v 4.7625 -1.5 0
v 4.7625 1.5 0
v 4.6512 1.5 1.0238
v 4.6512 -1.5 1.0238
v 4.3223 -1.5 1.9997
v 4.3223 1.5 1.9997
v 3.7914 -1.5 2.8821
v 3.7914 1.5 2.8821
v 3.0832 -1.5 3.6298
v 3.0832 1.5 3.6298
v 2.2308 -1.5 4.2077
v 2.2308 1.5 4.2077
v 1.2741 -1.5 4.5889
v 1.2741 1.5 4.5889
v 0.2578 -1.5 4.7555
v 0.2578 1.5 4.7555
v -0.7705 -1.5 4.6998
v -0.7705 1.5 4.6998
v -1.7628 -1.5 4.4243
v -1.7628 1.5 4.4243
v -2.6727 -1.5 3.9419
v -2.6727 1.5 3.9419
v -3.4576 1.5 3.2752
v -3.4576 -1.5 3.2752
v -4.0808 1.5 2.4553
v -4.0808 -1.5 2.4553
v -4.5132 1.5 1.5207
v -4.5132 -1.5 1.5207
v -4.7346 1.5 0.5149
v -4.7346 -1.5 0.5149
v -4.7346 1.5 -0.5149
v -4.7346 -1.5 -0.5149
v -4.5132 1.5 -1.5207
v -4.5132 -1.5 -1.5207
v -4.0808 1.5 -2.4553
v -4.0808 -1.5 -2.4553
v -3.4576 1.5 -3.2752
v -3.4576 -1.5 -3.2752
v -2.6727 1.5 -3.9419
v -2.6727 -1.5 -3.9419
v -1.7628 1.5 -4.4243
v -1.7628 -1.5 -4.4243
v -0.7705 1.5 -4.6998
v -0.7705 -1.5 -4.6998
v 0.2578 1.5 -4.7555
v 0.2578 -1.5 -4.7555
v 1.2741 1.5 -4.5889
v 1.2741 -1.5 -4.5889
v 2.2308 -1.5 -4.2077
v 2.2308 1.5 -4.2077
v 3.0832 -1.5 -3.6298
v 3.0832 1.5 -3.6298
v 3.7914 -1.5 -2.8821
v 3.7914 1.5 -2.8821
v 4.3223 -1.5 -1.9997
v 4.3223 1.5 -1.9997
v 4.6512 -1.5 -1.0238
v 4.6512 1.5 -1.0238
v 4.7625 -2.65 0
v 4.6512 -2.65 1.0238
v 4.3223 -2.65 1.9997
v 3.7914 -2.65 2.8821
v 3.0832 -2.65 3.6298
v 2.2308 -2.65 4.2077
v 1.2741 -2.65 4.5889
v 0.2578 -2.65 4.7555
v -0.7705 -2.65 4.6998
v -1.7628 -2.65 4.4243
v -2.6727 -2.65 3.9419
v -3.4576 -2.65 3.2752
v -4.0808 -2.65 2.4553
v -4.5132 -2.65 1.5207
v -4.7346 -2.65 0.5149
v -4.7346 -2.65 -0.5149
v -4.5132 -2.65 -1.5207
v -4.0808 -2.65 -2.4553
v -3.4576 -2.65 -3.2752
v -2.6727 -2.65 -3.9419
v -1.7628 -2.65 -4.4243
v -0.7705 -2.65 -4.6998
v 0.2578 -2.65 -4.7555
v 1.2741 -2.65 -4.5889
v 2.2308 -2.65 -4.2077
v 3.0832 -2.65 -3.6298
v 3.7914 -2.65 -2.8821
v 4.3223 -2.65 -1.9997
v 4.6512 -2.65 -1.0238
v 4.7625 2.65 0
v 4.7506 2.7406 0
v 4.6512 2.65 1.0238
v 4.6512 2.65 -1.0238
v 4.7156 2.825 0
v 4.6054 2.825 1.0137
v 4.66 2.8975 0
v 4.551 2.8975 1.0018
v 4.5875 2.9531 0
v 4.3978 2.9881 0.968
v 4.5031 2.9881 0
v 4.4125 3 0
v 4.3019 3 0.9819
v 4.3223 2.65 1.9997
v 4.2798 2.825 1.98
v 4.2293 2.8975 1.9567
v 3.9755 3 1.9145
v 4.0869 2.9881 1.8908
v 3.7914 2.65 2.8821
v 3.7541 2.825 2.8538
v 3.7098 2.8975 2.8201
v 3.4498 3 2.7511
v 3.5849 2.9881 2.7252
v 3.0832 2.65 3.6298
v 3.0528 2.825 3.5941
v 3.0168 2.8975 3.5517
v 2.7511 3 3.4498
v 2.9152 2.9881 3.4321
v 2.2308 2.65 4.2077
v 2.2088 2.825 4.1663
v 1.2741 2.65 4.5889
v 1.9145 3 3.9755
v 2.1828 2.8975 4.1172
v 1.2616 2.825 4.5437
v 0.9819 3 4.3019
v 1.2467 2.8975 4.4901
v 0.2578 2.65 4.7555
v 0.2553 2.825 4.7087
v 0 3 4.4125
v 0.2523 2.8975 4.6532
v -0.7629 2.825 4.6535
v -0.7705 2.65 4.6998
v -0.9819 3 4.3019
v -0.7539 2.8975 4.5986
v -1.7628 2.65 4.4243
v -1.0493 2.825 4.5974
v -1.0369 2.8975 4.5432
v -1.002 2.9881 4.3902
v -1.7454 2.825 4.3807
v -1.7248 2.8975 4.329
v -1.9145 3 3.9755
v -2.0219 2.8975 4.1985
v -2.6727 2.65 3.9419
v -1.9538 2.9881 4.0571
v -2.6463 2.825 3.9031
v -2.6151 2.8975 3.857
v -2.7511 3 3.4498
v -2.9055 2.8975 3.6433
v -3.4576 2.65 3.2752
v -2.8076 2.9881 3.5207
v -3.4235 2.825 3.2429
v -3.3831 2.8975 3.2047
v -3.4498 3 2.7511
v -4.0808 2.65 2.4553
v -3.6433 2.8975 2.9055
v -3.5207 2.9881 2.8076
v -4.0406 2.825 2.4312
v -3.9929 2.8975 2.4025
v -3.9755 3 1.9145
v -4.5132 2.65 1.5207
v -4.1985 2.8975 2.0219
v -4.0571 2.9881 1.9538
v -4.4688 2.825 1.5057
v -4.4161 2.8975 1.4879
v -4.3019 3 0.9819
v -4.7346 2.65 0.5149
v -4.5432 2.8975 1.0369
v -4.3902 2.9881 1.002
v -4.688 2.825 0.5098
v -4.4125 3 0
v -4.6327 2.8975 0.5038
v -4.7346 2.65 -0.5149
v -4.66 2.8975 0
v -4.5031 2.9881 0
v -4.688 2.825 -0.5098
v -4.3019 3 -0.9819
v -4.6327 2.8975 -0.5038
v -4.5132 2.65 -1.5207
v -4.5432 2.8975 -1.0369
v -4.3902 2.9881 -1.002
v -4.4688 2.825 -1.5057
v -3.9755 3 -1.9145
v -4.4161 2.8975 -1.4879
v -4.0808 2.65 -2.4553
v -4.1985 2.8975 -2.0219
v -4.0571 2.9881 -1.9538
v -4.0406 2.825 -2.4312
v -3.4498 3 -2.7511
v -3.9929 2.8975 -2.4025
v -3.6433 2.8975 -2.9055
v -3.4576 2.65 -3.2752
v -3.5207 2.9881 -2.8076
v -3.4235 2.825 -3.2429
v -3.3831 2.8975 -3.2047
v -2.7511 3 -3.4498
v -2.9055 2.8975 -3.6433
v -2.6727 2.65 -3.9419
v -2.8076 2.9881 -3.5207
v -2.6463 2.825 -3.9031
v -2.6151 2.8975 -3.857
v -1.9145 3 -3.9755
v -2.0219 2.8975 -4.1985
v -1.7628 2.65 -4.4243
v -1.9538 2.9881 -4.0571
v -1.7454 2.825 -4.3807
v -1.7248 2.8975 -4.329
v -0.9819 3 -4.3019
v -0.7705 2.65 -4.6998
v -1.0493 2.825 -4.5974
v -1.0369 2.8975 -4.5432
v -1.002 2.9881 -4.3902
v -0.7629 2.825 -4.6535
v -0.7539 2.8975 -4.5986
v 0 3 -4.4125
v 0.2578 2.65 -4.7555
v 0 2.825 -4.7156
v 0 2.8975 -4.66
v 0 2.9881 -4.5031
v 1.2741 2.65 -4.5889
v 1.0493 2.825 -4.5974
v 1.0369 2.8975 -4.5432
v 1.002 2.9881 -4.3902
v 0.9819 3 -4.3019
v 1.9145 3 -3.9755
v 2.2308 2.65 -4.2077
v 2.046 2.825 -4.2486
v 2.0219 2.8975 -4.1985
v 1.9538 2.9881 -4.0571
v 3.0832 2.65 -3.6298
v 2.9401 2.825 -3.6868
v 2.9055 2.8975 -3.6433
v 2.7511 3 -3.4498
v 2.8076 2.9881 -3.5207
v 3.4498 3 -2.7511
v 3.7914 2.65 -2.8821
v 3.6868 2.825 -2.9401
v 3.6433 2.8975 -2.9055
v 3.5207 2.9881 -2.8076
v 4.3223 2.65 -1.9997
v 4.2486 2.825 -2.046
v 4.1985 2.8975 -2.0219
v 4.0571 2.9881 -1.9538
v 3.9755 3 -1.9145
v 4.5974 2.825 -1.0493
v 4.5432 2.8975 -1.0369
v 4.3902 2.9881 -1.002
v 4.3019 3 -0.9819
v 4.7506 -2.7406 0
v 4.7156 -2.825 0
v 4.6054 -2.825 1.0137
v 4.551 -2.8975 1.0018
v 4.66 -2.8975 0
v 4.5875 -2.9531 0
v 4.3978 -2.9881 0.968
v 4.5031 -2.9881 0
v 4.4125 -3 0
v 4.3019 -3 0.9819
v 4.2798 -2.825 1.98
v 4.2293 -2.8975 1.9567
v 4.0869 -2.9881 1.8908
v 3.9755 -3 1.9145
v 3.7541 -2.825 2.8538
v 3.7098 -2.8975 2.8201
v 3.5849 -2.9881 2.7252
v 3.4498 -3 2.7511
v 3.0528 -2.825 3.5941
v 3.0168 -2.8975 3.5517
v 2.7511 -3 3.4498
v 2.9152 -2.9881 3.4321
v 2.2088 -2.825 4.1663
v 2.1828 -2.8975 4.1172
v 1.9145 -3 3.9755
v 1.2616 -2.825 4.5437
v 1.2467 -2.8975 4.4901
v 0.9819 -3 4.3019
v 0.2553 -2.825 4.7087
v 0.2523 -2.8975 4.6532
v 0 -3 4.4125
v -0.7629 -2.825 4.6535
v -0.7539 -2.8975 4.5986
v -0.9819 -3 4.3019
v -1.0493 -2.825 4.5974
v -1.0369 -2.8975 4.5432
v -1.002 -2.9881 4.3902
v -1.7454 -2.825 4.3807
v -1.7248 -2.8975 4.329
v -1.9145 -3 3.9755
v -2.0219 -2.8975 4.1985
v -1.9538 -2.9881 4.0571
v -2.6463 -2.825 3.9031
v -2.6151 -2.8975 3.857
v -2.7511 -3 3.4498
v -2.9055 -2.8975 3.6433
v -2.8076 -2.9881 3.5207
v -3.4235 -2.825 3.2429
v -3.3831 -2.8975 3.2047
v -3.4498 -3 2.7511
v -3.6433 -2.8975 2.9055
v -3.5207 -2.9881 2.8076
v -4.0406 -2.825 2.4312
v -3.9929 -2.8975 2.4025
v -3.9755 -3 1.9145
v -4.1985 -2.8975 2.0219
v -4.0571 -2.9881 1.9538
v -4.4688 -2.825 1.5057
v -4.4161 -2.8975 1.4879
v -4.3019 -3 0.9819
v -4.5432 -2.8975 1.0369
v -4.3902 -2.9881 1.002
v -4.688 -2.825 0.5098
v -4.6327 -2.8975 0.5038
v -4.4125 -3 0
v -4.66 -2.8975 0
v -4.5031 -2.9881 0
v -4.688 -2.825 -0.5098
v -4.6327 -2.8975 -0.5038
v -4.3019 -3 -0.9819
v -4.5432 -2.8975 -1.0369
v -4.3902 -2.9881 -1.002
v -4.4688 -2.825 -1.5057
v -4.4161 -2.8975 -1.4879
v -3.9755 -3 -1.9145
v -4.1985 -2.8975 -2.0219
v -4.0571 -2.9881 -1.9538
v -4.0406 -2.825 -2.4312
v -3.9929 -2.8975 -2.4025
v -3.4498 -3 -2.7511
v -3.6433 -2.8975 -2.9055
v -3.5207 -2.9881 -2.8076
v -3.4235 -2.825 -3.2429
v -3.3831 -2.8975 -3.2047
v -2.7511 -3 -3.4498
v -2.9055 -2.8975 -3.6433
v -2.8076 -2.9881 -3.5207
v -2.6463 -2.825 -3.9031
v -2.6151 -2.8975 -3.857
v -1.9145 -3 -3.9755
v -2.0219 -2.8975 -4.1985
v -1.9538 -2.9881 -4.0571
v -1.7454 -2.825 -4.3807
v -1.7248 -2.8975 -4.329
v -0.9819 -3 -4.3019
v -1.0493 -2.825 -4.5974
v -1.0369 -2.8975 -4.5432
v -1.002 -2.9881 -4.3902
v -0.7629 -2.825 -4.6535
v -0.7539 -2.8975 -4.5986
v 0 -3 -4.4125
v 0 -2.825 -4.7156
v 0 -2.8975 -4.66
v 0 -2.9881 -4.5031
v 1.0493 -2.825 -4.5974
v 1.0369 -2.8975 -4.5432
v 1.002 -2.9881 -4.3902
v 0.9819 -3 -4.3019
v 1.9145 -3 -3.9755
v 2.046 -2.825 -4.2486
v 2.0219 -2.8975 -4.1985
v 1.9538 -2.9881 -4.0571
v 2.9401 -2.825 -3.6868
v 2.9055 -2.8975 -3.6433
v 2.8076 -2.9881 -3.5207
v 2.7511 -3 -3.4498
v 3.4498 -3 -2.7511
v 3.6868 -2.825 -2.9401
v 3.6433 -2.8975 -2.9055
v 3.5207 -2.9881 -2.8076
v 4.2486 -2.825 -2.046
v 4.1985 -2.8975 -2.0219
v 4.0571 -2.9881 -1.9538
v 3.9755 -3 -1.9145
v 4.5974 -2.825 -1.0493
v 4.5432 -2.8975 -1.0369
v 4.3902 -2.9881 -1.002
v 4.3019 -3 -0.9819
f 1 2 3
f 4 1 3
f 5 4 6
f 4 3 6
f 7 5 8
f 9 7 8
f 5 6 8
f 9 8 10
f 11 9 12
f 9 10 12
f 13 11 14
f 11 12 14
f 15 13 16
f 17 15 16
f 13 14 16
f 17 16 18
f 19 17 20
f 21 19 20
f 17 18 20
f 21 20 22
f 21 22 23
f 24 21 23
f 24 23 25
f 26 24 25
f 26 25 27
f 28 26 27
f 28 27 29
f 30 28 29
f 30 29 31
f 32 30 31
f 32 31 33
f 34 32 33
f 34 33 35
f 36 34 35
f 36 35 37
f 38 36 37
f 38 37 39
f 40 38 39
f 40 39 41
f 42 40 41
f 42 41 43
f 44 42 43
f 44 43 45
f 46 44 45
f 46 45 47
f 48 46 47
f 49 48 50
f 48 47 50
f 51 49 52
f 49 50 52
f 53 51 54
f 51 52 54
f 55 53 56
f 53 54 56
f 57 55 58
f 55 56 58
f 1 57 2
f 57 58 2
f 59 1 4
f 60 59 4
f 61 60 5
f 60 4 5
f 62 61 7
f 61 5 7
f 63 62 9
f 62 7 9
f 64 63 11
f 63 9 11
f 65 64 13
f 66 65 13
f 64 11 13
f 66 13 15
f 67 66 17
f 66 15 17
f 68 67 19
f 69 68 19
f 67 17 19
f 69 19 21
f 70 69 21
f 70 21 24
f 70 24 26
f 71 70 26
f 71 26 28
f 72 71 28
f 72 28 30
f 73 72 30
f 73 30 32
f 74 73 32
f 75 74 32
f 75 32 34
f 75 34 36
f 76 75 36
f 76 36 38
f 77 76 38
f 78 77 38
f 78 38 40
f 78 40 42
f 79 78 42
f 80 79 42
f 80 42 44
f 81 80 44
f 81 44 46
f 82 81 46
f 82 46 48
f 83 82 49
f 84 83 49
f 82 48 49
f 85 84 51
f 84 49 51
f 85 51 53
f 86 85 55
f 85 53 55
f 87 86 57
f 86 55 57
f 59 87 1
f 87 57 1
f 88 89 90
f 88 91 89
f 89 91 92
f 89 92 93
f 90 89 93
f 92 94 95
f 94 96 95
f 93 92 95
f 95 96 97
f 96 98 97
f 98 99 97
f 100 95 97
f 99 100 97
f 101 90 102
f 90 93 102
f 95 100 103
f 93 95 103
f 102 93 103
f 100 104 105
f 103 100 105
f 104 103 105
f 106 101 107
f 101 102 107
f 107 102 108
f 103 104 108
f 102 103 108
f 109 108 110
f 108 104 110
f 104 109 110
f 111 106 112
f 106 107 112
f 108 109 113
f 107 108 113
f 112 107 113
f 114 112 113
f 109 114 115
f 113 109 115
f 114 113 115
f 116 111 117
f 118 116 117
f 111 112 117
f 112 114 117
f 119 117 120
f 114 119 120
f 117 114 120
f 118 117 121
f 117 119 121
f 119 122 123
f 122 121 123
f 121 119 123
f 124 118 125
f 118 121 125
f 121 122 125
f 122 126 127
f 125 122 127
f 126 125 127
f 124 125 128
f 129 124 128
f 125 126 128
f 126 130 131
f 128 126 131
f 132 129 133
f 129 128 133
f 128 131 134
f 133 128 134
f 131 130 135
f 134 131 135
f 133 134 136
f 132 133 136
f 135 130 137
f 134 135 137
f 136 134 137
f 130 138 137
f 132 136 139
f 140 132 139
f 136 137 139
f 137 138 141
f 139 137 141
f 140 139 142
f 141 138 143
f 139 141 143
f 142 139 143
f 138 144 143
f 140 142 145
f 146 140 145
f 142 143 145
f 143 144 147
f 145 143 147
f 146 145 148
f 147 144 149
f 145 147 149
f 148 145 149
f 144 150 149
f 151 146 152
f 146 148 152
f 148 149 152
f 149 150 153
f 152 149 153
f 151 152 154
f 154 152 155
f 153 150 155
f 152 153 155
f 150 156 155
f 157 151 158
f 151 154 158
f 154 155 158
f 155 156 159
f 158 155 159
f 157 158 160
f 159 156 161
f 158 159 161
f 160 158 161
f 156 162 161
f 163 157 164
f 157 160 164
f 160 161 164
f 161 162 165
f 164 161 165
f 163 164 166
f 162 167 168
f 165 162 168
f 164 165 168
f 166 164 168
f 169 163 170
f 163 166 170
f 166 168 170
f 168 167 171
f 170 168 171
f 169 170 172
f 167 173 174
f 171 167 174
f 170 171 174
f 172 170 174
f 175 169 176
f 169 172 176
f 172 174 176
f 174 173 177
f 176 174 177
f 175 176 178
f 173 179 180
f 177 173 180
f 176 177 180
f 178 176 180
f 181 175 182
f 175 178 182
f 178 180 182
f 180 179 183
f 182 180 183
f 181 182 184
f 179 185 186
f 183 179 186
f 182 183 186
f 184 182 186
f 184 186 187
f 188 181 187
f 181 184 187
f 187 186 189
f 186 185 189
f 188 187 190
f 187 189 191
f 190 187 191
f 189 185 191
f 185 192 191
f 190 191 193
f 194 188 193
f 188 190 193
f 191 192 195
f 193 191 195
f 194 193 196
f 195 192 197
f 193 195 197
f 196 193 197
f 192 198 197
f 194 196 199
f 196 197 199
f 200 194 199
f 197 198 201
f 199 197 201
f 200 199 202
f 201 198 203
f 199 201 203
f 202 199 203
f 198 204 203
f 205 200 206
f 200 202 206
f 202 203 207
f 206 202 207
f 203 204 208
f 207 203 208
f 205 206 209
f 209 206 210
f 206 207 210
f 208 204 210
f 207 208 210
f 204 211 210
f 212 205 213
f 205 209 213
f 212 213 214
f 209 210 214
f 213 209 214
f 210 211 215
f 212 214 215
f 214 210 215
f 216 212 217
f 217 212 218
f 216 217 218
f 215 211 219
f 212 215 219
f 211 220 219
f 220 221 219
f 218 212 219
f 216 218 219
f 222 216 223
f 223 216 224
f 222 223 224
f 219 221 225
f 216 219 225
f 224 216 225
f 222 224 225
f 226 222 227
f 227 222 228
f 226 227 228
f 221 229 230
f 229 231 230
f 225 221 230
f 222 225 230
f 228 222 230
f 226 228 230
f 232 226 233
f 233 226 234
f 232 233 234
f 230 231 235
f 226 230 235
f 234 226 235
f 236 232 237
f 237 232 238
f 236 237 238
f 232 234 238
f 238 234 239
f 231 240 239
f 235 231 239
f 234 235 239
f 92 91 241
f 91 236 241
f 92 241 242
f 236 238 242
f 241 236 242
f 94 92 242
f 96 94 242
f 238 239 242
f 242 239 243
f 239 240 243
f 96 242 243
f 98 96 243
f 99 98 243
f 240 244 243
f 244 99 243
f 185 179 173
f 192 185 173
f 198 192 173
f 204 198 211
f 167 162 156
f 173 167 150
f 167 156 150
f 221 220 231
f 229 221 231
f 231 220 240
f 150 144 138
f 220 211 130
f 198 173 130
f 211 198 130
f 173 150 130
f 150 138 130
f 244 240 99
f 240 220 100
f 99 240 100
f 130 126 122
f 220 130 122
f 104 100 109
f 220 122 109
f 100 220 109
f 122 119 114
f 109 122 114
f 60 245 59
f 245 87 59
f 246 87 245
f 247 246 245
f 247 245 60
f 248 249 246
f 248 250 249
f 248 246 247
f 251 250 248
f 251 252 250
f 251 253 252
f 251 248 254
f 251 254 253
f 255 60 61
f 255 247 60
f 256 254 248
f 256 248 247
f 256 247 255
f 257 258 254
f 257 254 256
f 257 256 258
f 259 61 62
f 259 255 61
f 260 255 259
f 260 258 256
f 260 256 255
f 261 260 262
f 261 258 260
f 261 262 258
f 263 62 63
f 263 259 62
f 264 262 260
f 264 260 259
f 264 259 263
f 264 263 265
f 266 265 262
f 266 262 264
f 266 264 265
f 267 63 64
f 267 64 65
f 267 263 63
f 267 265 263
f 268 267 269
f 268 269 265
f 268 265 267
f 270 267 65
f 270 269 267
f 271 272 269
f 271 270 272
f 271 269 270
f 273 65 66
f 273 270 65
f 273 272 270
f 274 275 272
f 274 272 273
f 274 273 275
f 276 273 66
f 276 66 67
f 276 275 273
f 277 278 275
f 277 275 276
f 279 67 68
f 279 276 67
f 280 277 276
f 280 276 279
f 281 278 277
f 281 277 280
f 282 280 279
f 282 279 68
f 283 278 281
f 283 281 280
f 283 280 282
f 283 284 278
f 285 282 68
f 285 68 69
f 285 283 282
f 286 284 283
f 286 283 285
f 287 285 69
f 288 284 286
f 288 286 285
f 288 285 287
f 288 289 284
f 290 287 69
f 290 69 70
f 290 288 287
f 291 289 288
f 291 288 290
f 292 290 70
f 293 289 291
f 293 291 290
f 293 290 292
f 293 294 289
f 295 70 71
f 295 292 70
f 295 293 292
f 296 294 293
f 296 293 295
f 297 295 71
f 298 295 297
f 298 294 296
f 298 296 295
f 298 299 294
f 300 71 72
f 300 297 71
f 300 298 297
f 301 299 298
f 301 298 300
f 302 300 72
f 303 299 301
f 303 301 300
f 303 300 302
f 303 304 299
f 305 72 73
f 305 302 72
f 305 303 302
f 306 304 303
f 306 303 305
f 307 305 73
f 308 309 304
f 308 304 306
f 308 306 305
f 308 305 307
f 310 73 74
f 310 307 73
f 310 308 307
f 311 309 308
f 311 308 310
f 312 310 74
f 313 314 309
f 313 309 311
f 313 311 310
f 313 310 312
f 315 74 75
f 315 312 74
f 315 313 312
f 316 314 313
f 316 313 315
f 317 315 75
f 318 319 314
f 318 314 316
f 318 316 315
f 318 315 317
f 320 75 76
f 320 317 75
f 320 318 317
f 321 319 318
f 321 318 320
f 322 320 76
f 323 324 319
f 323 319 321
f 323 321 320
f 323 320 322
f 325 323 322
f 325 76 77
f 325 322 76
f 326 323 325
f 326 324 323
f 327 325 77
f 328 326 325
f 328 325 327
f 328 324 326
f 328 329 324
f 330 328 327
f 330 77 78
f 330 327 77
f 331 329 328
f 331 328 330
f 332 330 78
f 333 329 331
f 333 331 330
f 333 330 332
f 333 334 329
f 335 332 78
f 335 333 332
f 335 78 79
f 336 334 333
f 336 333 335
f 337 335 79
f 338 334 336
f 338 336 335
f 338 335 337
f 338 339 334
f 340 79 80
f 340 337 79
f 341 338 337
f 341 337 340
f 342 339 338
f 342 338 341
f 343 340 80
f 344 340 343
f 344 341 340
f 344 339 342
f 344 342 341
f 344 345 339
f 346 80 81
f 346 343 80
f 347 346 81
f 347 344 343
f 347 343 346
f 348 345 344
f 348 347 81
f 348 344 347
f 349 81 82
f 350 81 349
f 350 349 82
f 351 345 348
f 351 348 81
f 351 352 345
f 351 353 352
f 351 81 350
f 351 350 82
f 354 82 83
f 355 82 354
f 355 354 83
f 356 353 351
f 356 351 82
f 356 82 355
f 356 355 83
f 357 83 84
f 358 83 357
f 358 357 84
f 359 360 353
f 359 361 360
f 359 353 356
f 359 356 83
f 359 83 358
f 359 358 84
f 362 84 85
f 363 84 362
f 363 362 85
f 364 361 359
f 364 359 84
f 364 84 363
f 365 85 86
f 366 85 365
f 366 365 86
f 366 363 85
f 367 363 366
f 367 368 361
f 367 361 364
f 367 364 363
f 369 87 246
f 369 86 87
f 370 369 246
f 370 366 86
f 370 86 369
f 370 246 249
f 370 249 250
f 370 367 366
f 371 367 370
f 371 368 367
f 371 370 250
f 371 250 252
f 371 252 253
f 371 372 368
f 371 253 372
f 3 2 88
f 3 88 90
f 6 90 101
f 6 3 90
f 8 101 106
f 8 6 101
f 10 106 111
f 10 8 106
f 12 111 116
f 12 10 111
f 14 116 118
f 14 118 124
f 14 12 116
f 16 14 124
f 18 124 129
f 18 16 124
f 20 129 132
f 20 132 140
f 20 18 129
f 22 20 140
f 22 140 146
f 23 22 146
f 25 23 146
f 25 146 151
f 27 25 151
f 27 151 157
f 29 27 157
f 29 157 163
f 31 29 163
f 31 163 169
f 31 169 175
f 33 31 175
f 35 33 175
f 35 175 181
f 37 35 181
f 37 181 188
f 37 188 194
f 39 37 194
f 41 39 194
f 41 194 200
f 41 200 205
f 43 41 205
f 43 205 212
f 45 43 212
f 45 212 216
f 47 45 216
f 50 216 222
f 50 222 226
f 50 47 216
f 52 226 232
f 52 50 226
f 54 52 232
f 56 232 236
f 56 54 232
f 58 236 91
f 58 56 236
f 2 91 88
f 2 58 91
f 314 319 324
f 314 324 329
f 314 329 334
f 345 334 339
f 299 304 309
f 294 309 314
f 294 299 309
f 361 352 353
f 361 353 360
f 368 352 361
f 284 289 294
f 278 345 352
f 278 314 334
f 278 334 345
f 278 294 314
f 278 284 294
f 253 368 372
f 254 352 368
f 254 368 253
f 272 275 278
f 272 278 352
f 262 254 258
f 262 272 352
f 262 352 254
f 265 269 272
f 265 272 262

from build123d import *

# Parameters (mm, degrees)
F0_R     = 4.7625
F1_DEPTH = 1.5
F2_R     = 4.7625
F3_DEPTH = 1.5
F4_R     = 0.35


with BuildPart() as f1:
    # F0 (on Front) → F1 (new body, symmetric)
    with BuildSketch(Plane.XZ):
        Circle(F0_R)
    extrude(amount=F1_DEPTH, both=True)

    # F2 (on face) → F3 (join)
    with BuildSketch(Plane.XZ.offset(1.5)):
        Circle(F2_R)
    extrude(amount=F3_DEPTH)

    # F4
    f4_edges = [f1.edges().sort_by_distance(p)[0] for p in [
        (-4.7625, -3, 0),
    ]]
    fillet(f4_edges, radius=F4_R)

    # F5: F1 across plane


with BuildPart() as f1_1:
    add(f1.part)
    add(f1.part.mirror(Plane.XZ))


solid = f1_1.part
